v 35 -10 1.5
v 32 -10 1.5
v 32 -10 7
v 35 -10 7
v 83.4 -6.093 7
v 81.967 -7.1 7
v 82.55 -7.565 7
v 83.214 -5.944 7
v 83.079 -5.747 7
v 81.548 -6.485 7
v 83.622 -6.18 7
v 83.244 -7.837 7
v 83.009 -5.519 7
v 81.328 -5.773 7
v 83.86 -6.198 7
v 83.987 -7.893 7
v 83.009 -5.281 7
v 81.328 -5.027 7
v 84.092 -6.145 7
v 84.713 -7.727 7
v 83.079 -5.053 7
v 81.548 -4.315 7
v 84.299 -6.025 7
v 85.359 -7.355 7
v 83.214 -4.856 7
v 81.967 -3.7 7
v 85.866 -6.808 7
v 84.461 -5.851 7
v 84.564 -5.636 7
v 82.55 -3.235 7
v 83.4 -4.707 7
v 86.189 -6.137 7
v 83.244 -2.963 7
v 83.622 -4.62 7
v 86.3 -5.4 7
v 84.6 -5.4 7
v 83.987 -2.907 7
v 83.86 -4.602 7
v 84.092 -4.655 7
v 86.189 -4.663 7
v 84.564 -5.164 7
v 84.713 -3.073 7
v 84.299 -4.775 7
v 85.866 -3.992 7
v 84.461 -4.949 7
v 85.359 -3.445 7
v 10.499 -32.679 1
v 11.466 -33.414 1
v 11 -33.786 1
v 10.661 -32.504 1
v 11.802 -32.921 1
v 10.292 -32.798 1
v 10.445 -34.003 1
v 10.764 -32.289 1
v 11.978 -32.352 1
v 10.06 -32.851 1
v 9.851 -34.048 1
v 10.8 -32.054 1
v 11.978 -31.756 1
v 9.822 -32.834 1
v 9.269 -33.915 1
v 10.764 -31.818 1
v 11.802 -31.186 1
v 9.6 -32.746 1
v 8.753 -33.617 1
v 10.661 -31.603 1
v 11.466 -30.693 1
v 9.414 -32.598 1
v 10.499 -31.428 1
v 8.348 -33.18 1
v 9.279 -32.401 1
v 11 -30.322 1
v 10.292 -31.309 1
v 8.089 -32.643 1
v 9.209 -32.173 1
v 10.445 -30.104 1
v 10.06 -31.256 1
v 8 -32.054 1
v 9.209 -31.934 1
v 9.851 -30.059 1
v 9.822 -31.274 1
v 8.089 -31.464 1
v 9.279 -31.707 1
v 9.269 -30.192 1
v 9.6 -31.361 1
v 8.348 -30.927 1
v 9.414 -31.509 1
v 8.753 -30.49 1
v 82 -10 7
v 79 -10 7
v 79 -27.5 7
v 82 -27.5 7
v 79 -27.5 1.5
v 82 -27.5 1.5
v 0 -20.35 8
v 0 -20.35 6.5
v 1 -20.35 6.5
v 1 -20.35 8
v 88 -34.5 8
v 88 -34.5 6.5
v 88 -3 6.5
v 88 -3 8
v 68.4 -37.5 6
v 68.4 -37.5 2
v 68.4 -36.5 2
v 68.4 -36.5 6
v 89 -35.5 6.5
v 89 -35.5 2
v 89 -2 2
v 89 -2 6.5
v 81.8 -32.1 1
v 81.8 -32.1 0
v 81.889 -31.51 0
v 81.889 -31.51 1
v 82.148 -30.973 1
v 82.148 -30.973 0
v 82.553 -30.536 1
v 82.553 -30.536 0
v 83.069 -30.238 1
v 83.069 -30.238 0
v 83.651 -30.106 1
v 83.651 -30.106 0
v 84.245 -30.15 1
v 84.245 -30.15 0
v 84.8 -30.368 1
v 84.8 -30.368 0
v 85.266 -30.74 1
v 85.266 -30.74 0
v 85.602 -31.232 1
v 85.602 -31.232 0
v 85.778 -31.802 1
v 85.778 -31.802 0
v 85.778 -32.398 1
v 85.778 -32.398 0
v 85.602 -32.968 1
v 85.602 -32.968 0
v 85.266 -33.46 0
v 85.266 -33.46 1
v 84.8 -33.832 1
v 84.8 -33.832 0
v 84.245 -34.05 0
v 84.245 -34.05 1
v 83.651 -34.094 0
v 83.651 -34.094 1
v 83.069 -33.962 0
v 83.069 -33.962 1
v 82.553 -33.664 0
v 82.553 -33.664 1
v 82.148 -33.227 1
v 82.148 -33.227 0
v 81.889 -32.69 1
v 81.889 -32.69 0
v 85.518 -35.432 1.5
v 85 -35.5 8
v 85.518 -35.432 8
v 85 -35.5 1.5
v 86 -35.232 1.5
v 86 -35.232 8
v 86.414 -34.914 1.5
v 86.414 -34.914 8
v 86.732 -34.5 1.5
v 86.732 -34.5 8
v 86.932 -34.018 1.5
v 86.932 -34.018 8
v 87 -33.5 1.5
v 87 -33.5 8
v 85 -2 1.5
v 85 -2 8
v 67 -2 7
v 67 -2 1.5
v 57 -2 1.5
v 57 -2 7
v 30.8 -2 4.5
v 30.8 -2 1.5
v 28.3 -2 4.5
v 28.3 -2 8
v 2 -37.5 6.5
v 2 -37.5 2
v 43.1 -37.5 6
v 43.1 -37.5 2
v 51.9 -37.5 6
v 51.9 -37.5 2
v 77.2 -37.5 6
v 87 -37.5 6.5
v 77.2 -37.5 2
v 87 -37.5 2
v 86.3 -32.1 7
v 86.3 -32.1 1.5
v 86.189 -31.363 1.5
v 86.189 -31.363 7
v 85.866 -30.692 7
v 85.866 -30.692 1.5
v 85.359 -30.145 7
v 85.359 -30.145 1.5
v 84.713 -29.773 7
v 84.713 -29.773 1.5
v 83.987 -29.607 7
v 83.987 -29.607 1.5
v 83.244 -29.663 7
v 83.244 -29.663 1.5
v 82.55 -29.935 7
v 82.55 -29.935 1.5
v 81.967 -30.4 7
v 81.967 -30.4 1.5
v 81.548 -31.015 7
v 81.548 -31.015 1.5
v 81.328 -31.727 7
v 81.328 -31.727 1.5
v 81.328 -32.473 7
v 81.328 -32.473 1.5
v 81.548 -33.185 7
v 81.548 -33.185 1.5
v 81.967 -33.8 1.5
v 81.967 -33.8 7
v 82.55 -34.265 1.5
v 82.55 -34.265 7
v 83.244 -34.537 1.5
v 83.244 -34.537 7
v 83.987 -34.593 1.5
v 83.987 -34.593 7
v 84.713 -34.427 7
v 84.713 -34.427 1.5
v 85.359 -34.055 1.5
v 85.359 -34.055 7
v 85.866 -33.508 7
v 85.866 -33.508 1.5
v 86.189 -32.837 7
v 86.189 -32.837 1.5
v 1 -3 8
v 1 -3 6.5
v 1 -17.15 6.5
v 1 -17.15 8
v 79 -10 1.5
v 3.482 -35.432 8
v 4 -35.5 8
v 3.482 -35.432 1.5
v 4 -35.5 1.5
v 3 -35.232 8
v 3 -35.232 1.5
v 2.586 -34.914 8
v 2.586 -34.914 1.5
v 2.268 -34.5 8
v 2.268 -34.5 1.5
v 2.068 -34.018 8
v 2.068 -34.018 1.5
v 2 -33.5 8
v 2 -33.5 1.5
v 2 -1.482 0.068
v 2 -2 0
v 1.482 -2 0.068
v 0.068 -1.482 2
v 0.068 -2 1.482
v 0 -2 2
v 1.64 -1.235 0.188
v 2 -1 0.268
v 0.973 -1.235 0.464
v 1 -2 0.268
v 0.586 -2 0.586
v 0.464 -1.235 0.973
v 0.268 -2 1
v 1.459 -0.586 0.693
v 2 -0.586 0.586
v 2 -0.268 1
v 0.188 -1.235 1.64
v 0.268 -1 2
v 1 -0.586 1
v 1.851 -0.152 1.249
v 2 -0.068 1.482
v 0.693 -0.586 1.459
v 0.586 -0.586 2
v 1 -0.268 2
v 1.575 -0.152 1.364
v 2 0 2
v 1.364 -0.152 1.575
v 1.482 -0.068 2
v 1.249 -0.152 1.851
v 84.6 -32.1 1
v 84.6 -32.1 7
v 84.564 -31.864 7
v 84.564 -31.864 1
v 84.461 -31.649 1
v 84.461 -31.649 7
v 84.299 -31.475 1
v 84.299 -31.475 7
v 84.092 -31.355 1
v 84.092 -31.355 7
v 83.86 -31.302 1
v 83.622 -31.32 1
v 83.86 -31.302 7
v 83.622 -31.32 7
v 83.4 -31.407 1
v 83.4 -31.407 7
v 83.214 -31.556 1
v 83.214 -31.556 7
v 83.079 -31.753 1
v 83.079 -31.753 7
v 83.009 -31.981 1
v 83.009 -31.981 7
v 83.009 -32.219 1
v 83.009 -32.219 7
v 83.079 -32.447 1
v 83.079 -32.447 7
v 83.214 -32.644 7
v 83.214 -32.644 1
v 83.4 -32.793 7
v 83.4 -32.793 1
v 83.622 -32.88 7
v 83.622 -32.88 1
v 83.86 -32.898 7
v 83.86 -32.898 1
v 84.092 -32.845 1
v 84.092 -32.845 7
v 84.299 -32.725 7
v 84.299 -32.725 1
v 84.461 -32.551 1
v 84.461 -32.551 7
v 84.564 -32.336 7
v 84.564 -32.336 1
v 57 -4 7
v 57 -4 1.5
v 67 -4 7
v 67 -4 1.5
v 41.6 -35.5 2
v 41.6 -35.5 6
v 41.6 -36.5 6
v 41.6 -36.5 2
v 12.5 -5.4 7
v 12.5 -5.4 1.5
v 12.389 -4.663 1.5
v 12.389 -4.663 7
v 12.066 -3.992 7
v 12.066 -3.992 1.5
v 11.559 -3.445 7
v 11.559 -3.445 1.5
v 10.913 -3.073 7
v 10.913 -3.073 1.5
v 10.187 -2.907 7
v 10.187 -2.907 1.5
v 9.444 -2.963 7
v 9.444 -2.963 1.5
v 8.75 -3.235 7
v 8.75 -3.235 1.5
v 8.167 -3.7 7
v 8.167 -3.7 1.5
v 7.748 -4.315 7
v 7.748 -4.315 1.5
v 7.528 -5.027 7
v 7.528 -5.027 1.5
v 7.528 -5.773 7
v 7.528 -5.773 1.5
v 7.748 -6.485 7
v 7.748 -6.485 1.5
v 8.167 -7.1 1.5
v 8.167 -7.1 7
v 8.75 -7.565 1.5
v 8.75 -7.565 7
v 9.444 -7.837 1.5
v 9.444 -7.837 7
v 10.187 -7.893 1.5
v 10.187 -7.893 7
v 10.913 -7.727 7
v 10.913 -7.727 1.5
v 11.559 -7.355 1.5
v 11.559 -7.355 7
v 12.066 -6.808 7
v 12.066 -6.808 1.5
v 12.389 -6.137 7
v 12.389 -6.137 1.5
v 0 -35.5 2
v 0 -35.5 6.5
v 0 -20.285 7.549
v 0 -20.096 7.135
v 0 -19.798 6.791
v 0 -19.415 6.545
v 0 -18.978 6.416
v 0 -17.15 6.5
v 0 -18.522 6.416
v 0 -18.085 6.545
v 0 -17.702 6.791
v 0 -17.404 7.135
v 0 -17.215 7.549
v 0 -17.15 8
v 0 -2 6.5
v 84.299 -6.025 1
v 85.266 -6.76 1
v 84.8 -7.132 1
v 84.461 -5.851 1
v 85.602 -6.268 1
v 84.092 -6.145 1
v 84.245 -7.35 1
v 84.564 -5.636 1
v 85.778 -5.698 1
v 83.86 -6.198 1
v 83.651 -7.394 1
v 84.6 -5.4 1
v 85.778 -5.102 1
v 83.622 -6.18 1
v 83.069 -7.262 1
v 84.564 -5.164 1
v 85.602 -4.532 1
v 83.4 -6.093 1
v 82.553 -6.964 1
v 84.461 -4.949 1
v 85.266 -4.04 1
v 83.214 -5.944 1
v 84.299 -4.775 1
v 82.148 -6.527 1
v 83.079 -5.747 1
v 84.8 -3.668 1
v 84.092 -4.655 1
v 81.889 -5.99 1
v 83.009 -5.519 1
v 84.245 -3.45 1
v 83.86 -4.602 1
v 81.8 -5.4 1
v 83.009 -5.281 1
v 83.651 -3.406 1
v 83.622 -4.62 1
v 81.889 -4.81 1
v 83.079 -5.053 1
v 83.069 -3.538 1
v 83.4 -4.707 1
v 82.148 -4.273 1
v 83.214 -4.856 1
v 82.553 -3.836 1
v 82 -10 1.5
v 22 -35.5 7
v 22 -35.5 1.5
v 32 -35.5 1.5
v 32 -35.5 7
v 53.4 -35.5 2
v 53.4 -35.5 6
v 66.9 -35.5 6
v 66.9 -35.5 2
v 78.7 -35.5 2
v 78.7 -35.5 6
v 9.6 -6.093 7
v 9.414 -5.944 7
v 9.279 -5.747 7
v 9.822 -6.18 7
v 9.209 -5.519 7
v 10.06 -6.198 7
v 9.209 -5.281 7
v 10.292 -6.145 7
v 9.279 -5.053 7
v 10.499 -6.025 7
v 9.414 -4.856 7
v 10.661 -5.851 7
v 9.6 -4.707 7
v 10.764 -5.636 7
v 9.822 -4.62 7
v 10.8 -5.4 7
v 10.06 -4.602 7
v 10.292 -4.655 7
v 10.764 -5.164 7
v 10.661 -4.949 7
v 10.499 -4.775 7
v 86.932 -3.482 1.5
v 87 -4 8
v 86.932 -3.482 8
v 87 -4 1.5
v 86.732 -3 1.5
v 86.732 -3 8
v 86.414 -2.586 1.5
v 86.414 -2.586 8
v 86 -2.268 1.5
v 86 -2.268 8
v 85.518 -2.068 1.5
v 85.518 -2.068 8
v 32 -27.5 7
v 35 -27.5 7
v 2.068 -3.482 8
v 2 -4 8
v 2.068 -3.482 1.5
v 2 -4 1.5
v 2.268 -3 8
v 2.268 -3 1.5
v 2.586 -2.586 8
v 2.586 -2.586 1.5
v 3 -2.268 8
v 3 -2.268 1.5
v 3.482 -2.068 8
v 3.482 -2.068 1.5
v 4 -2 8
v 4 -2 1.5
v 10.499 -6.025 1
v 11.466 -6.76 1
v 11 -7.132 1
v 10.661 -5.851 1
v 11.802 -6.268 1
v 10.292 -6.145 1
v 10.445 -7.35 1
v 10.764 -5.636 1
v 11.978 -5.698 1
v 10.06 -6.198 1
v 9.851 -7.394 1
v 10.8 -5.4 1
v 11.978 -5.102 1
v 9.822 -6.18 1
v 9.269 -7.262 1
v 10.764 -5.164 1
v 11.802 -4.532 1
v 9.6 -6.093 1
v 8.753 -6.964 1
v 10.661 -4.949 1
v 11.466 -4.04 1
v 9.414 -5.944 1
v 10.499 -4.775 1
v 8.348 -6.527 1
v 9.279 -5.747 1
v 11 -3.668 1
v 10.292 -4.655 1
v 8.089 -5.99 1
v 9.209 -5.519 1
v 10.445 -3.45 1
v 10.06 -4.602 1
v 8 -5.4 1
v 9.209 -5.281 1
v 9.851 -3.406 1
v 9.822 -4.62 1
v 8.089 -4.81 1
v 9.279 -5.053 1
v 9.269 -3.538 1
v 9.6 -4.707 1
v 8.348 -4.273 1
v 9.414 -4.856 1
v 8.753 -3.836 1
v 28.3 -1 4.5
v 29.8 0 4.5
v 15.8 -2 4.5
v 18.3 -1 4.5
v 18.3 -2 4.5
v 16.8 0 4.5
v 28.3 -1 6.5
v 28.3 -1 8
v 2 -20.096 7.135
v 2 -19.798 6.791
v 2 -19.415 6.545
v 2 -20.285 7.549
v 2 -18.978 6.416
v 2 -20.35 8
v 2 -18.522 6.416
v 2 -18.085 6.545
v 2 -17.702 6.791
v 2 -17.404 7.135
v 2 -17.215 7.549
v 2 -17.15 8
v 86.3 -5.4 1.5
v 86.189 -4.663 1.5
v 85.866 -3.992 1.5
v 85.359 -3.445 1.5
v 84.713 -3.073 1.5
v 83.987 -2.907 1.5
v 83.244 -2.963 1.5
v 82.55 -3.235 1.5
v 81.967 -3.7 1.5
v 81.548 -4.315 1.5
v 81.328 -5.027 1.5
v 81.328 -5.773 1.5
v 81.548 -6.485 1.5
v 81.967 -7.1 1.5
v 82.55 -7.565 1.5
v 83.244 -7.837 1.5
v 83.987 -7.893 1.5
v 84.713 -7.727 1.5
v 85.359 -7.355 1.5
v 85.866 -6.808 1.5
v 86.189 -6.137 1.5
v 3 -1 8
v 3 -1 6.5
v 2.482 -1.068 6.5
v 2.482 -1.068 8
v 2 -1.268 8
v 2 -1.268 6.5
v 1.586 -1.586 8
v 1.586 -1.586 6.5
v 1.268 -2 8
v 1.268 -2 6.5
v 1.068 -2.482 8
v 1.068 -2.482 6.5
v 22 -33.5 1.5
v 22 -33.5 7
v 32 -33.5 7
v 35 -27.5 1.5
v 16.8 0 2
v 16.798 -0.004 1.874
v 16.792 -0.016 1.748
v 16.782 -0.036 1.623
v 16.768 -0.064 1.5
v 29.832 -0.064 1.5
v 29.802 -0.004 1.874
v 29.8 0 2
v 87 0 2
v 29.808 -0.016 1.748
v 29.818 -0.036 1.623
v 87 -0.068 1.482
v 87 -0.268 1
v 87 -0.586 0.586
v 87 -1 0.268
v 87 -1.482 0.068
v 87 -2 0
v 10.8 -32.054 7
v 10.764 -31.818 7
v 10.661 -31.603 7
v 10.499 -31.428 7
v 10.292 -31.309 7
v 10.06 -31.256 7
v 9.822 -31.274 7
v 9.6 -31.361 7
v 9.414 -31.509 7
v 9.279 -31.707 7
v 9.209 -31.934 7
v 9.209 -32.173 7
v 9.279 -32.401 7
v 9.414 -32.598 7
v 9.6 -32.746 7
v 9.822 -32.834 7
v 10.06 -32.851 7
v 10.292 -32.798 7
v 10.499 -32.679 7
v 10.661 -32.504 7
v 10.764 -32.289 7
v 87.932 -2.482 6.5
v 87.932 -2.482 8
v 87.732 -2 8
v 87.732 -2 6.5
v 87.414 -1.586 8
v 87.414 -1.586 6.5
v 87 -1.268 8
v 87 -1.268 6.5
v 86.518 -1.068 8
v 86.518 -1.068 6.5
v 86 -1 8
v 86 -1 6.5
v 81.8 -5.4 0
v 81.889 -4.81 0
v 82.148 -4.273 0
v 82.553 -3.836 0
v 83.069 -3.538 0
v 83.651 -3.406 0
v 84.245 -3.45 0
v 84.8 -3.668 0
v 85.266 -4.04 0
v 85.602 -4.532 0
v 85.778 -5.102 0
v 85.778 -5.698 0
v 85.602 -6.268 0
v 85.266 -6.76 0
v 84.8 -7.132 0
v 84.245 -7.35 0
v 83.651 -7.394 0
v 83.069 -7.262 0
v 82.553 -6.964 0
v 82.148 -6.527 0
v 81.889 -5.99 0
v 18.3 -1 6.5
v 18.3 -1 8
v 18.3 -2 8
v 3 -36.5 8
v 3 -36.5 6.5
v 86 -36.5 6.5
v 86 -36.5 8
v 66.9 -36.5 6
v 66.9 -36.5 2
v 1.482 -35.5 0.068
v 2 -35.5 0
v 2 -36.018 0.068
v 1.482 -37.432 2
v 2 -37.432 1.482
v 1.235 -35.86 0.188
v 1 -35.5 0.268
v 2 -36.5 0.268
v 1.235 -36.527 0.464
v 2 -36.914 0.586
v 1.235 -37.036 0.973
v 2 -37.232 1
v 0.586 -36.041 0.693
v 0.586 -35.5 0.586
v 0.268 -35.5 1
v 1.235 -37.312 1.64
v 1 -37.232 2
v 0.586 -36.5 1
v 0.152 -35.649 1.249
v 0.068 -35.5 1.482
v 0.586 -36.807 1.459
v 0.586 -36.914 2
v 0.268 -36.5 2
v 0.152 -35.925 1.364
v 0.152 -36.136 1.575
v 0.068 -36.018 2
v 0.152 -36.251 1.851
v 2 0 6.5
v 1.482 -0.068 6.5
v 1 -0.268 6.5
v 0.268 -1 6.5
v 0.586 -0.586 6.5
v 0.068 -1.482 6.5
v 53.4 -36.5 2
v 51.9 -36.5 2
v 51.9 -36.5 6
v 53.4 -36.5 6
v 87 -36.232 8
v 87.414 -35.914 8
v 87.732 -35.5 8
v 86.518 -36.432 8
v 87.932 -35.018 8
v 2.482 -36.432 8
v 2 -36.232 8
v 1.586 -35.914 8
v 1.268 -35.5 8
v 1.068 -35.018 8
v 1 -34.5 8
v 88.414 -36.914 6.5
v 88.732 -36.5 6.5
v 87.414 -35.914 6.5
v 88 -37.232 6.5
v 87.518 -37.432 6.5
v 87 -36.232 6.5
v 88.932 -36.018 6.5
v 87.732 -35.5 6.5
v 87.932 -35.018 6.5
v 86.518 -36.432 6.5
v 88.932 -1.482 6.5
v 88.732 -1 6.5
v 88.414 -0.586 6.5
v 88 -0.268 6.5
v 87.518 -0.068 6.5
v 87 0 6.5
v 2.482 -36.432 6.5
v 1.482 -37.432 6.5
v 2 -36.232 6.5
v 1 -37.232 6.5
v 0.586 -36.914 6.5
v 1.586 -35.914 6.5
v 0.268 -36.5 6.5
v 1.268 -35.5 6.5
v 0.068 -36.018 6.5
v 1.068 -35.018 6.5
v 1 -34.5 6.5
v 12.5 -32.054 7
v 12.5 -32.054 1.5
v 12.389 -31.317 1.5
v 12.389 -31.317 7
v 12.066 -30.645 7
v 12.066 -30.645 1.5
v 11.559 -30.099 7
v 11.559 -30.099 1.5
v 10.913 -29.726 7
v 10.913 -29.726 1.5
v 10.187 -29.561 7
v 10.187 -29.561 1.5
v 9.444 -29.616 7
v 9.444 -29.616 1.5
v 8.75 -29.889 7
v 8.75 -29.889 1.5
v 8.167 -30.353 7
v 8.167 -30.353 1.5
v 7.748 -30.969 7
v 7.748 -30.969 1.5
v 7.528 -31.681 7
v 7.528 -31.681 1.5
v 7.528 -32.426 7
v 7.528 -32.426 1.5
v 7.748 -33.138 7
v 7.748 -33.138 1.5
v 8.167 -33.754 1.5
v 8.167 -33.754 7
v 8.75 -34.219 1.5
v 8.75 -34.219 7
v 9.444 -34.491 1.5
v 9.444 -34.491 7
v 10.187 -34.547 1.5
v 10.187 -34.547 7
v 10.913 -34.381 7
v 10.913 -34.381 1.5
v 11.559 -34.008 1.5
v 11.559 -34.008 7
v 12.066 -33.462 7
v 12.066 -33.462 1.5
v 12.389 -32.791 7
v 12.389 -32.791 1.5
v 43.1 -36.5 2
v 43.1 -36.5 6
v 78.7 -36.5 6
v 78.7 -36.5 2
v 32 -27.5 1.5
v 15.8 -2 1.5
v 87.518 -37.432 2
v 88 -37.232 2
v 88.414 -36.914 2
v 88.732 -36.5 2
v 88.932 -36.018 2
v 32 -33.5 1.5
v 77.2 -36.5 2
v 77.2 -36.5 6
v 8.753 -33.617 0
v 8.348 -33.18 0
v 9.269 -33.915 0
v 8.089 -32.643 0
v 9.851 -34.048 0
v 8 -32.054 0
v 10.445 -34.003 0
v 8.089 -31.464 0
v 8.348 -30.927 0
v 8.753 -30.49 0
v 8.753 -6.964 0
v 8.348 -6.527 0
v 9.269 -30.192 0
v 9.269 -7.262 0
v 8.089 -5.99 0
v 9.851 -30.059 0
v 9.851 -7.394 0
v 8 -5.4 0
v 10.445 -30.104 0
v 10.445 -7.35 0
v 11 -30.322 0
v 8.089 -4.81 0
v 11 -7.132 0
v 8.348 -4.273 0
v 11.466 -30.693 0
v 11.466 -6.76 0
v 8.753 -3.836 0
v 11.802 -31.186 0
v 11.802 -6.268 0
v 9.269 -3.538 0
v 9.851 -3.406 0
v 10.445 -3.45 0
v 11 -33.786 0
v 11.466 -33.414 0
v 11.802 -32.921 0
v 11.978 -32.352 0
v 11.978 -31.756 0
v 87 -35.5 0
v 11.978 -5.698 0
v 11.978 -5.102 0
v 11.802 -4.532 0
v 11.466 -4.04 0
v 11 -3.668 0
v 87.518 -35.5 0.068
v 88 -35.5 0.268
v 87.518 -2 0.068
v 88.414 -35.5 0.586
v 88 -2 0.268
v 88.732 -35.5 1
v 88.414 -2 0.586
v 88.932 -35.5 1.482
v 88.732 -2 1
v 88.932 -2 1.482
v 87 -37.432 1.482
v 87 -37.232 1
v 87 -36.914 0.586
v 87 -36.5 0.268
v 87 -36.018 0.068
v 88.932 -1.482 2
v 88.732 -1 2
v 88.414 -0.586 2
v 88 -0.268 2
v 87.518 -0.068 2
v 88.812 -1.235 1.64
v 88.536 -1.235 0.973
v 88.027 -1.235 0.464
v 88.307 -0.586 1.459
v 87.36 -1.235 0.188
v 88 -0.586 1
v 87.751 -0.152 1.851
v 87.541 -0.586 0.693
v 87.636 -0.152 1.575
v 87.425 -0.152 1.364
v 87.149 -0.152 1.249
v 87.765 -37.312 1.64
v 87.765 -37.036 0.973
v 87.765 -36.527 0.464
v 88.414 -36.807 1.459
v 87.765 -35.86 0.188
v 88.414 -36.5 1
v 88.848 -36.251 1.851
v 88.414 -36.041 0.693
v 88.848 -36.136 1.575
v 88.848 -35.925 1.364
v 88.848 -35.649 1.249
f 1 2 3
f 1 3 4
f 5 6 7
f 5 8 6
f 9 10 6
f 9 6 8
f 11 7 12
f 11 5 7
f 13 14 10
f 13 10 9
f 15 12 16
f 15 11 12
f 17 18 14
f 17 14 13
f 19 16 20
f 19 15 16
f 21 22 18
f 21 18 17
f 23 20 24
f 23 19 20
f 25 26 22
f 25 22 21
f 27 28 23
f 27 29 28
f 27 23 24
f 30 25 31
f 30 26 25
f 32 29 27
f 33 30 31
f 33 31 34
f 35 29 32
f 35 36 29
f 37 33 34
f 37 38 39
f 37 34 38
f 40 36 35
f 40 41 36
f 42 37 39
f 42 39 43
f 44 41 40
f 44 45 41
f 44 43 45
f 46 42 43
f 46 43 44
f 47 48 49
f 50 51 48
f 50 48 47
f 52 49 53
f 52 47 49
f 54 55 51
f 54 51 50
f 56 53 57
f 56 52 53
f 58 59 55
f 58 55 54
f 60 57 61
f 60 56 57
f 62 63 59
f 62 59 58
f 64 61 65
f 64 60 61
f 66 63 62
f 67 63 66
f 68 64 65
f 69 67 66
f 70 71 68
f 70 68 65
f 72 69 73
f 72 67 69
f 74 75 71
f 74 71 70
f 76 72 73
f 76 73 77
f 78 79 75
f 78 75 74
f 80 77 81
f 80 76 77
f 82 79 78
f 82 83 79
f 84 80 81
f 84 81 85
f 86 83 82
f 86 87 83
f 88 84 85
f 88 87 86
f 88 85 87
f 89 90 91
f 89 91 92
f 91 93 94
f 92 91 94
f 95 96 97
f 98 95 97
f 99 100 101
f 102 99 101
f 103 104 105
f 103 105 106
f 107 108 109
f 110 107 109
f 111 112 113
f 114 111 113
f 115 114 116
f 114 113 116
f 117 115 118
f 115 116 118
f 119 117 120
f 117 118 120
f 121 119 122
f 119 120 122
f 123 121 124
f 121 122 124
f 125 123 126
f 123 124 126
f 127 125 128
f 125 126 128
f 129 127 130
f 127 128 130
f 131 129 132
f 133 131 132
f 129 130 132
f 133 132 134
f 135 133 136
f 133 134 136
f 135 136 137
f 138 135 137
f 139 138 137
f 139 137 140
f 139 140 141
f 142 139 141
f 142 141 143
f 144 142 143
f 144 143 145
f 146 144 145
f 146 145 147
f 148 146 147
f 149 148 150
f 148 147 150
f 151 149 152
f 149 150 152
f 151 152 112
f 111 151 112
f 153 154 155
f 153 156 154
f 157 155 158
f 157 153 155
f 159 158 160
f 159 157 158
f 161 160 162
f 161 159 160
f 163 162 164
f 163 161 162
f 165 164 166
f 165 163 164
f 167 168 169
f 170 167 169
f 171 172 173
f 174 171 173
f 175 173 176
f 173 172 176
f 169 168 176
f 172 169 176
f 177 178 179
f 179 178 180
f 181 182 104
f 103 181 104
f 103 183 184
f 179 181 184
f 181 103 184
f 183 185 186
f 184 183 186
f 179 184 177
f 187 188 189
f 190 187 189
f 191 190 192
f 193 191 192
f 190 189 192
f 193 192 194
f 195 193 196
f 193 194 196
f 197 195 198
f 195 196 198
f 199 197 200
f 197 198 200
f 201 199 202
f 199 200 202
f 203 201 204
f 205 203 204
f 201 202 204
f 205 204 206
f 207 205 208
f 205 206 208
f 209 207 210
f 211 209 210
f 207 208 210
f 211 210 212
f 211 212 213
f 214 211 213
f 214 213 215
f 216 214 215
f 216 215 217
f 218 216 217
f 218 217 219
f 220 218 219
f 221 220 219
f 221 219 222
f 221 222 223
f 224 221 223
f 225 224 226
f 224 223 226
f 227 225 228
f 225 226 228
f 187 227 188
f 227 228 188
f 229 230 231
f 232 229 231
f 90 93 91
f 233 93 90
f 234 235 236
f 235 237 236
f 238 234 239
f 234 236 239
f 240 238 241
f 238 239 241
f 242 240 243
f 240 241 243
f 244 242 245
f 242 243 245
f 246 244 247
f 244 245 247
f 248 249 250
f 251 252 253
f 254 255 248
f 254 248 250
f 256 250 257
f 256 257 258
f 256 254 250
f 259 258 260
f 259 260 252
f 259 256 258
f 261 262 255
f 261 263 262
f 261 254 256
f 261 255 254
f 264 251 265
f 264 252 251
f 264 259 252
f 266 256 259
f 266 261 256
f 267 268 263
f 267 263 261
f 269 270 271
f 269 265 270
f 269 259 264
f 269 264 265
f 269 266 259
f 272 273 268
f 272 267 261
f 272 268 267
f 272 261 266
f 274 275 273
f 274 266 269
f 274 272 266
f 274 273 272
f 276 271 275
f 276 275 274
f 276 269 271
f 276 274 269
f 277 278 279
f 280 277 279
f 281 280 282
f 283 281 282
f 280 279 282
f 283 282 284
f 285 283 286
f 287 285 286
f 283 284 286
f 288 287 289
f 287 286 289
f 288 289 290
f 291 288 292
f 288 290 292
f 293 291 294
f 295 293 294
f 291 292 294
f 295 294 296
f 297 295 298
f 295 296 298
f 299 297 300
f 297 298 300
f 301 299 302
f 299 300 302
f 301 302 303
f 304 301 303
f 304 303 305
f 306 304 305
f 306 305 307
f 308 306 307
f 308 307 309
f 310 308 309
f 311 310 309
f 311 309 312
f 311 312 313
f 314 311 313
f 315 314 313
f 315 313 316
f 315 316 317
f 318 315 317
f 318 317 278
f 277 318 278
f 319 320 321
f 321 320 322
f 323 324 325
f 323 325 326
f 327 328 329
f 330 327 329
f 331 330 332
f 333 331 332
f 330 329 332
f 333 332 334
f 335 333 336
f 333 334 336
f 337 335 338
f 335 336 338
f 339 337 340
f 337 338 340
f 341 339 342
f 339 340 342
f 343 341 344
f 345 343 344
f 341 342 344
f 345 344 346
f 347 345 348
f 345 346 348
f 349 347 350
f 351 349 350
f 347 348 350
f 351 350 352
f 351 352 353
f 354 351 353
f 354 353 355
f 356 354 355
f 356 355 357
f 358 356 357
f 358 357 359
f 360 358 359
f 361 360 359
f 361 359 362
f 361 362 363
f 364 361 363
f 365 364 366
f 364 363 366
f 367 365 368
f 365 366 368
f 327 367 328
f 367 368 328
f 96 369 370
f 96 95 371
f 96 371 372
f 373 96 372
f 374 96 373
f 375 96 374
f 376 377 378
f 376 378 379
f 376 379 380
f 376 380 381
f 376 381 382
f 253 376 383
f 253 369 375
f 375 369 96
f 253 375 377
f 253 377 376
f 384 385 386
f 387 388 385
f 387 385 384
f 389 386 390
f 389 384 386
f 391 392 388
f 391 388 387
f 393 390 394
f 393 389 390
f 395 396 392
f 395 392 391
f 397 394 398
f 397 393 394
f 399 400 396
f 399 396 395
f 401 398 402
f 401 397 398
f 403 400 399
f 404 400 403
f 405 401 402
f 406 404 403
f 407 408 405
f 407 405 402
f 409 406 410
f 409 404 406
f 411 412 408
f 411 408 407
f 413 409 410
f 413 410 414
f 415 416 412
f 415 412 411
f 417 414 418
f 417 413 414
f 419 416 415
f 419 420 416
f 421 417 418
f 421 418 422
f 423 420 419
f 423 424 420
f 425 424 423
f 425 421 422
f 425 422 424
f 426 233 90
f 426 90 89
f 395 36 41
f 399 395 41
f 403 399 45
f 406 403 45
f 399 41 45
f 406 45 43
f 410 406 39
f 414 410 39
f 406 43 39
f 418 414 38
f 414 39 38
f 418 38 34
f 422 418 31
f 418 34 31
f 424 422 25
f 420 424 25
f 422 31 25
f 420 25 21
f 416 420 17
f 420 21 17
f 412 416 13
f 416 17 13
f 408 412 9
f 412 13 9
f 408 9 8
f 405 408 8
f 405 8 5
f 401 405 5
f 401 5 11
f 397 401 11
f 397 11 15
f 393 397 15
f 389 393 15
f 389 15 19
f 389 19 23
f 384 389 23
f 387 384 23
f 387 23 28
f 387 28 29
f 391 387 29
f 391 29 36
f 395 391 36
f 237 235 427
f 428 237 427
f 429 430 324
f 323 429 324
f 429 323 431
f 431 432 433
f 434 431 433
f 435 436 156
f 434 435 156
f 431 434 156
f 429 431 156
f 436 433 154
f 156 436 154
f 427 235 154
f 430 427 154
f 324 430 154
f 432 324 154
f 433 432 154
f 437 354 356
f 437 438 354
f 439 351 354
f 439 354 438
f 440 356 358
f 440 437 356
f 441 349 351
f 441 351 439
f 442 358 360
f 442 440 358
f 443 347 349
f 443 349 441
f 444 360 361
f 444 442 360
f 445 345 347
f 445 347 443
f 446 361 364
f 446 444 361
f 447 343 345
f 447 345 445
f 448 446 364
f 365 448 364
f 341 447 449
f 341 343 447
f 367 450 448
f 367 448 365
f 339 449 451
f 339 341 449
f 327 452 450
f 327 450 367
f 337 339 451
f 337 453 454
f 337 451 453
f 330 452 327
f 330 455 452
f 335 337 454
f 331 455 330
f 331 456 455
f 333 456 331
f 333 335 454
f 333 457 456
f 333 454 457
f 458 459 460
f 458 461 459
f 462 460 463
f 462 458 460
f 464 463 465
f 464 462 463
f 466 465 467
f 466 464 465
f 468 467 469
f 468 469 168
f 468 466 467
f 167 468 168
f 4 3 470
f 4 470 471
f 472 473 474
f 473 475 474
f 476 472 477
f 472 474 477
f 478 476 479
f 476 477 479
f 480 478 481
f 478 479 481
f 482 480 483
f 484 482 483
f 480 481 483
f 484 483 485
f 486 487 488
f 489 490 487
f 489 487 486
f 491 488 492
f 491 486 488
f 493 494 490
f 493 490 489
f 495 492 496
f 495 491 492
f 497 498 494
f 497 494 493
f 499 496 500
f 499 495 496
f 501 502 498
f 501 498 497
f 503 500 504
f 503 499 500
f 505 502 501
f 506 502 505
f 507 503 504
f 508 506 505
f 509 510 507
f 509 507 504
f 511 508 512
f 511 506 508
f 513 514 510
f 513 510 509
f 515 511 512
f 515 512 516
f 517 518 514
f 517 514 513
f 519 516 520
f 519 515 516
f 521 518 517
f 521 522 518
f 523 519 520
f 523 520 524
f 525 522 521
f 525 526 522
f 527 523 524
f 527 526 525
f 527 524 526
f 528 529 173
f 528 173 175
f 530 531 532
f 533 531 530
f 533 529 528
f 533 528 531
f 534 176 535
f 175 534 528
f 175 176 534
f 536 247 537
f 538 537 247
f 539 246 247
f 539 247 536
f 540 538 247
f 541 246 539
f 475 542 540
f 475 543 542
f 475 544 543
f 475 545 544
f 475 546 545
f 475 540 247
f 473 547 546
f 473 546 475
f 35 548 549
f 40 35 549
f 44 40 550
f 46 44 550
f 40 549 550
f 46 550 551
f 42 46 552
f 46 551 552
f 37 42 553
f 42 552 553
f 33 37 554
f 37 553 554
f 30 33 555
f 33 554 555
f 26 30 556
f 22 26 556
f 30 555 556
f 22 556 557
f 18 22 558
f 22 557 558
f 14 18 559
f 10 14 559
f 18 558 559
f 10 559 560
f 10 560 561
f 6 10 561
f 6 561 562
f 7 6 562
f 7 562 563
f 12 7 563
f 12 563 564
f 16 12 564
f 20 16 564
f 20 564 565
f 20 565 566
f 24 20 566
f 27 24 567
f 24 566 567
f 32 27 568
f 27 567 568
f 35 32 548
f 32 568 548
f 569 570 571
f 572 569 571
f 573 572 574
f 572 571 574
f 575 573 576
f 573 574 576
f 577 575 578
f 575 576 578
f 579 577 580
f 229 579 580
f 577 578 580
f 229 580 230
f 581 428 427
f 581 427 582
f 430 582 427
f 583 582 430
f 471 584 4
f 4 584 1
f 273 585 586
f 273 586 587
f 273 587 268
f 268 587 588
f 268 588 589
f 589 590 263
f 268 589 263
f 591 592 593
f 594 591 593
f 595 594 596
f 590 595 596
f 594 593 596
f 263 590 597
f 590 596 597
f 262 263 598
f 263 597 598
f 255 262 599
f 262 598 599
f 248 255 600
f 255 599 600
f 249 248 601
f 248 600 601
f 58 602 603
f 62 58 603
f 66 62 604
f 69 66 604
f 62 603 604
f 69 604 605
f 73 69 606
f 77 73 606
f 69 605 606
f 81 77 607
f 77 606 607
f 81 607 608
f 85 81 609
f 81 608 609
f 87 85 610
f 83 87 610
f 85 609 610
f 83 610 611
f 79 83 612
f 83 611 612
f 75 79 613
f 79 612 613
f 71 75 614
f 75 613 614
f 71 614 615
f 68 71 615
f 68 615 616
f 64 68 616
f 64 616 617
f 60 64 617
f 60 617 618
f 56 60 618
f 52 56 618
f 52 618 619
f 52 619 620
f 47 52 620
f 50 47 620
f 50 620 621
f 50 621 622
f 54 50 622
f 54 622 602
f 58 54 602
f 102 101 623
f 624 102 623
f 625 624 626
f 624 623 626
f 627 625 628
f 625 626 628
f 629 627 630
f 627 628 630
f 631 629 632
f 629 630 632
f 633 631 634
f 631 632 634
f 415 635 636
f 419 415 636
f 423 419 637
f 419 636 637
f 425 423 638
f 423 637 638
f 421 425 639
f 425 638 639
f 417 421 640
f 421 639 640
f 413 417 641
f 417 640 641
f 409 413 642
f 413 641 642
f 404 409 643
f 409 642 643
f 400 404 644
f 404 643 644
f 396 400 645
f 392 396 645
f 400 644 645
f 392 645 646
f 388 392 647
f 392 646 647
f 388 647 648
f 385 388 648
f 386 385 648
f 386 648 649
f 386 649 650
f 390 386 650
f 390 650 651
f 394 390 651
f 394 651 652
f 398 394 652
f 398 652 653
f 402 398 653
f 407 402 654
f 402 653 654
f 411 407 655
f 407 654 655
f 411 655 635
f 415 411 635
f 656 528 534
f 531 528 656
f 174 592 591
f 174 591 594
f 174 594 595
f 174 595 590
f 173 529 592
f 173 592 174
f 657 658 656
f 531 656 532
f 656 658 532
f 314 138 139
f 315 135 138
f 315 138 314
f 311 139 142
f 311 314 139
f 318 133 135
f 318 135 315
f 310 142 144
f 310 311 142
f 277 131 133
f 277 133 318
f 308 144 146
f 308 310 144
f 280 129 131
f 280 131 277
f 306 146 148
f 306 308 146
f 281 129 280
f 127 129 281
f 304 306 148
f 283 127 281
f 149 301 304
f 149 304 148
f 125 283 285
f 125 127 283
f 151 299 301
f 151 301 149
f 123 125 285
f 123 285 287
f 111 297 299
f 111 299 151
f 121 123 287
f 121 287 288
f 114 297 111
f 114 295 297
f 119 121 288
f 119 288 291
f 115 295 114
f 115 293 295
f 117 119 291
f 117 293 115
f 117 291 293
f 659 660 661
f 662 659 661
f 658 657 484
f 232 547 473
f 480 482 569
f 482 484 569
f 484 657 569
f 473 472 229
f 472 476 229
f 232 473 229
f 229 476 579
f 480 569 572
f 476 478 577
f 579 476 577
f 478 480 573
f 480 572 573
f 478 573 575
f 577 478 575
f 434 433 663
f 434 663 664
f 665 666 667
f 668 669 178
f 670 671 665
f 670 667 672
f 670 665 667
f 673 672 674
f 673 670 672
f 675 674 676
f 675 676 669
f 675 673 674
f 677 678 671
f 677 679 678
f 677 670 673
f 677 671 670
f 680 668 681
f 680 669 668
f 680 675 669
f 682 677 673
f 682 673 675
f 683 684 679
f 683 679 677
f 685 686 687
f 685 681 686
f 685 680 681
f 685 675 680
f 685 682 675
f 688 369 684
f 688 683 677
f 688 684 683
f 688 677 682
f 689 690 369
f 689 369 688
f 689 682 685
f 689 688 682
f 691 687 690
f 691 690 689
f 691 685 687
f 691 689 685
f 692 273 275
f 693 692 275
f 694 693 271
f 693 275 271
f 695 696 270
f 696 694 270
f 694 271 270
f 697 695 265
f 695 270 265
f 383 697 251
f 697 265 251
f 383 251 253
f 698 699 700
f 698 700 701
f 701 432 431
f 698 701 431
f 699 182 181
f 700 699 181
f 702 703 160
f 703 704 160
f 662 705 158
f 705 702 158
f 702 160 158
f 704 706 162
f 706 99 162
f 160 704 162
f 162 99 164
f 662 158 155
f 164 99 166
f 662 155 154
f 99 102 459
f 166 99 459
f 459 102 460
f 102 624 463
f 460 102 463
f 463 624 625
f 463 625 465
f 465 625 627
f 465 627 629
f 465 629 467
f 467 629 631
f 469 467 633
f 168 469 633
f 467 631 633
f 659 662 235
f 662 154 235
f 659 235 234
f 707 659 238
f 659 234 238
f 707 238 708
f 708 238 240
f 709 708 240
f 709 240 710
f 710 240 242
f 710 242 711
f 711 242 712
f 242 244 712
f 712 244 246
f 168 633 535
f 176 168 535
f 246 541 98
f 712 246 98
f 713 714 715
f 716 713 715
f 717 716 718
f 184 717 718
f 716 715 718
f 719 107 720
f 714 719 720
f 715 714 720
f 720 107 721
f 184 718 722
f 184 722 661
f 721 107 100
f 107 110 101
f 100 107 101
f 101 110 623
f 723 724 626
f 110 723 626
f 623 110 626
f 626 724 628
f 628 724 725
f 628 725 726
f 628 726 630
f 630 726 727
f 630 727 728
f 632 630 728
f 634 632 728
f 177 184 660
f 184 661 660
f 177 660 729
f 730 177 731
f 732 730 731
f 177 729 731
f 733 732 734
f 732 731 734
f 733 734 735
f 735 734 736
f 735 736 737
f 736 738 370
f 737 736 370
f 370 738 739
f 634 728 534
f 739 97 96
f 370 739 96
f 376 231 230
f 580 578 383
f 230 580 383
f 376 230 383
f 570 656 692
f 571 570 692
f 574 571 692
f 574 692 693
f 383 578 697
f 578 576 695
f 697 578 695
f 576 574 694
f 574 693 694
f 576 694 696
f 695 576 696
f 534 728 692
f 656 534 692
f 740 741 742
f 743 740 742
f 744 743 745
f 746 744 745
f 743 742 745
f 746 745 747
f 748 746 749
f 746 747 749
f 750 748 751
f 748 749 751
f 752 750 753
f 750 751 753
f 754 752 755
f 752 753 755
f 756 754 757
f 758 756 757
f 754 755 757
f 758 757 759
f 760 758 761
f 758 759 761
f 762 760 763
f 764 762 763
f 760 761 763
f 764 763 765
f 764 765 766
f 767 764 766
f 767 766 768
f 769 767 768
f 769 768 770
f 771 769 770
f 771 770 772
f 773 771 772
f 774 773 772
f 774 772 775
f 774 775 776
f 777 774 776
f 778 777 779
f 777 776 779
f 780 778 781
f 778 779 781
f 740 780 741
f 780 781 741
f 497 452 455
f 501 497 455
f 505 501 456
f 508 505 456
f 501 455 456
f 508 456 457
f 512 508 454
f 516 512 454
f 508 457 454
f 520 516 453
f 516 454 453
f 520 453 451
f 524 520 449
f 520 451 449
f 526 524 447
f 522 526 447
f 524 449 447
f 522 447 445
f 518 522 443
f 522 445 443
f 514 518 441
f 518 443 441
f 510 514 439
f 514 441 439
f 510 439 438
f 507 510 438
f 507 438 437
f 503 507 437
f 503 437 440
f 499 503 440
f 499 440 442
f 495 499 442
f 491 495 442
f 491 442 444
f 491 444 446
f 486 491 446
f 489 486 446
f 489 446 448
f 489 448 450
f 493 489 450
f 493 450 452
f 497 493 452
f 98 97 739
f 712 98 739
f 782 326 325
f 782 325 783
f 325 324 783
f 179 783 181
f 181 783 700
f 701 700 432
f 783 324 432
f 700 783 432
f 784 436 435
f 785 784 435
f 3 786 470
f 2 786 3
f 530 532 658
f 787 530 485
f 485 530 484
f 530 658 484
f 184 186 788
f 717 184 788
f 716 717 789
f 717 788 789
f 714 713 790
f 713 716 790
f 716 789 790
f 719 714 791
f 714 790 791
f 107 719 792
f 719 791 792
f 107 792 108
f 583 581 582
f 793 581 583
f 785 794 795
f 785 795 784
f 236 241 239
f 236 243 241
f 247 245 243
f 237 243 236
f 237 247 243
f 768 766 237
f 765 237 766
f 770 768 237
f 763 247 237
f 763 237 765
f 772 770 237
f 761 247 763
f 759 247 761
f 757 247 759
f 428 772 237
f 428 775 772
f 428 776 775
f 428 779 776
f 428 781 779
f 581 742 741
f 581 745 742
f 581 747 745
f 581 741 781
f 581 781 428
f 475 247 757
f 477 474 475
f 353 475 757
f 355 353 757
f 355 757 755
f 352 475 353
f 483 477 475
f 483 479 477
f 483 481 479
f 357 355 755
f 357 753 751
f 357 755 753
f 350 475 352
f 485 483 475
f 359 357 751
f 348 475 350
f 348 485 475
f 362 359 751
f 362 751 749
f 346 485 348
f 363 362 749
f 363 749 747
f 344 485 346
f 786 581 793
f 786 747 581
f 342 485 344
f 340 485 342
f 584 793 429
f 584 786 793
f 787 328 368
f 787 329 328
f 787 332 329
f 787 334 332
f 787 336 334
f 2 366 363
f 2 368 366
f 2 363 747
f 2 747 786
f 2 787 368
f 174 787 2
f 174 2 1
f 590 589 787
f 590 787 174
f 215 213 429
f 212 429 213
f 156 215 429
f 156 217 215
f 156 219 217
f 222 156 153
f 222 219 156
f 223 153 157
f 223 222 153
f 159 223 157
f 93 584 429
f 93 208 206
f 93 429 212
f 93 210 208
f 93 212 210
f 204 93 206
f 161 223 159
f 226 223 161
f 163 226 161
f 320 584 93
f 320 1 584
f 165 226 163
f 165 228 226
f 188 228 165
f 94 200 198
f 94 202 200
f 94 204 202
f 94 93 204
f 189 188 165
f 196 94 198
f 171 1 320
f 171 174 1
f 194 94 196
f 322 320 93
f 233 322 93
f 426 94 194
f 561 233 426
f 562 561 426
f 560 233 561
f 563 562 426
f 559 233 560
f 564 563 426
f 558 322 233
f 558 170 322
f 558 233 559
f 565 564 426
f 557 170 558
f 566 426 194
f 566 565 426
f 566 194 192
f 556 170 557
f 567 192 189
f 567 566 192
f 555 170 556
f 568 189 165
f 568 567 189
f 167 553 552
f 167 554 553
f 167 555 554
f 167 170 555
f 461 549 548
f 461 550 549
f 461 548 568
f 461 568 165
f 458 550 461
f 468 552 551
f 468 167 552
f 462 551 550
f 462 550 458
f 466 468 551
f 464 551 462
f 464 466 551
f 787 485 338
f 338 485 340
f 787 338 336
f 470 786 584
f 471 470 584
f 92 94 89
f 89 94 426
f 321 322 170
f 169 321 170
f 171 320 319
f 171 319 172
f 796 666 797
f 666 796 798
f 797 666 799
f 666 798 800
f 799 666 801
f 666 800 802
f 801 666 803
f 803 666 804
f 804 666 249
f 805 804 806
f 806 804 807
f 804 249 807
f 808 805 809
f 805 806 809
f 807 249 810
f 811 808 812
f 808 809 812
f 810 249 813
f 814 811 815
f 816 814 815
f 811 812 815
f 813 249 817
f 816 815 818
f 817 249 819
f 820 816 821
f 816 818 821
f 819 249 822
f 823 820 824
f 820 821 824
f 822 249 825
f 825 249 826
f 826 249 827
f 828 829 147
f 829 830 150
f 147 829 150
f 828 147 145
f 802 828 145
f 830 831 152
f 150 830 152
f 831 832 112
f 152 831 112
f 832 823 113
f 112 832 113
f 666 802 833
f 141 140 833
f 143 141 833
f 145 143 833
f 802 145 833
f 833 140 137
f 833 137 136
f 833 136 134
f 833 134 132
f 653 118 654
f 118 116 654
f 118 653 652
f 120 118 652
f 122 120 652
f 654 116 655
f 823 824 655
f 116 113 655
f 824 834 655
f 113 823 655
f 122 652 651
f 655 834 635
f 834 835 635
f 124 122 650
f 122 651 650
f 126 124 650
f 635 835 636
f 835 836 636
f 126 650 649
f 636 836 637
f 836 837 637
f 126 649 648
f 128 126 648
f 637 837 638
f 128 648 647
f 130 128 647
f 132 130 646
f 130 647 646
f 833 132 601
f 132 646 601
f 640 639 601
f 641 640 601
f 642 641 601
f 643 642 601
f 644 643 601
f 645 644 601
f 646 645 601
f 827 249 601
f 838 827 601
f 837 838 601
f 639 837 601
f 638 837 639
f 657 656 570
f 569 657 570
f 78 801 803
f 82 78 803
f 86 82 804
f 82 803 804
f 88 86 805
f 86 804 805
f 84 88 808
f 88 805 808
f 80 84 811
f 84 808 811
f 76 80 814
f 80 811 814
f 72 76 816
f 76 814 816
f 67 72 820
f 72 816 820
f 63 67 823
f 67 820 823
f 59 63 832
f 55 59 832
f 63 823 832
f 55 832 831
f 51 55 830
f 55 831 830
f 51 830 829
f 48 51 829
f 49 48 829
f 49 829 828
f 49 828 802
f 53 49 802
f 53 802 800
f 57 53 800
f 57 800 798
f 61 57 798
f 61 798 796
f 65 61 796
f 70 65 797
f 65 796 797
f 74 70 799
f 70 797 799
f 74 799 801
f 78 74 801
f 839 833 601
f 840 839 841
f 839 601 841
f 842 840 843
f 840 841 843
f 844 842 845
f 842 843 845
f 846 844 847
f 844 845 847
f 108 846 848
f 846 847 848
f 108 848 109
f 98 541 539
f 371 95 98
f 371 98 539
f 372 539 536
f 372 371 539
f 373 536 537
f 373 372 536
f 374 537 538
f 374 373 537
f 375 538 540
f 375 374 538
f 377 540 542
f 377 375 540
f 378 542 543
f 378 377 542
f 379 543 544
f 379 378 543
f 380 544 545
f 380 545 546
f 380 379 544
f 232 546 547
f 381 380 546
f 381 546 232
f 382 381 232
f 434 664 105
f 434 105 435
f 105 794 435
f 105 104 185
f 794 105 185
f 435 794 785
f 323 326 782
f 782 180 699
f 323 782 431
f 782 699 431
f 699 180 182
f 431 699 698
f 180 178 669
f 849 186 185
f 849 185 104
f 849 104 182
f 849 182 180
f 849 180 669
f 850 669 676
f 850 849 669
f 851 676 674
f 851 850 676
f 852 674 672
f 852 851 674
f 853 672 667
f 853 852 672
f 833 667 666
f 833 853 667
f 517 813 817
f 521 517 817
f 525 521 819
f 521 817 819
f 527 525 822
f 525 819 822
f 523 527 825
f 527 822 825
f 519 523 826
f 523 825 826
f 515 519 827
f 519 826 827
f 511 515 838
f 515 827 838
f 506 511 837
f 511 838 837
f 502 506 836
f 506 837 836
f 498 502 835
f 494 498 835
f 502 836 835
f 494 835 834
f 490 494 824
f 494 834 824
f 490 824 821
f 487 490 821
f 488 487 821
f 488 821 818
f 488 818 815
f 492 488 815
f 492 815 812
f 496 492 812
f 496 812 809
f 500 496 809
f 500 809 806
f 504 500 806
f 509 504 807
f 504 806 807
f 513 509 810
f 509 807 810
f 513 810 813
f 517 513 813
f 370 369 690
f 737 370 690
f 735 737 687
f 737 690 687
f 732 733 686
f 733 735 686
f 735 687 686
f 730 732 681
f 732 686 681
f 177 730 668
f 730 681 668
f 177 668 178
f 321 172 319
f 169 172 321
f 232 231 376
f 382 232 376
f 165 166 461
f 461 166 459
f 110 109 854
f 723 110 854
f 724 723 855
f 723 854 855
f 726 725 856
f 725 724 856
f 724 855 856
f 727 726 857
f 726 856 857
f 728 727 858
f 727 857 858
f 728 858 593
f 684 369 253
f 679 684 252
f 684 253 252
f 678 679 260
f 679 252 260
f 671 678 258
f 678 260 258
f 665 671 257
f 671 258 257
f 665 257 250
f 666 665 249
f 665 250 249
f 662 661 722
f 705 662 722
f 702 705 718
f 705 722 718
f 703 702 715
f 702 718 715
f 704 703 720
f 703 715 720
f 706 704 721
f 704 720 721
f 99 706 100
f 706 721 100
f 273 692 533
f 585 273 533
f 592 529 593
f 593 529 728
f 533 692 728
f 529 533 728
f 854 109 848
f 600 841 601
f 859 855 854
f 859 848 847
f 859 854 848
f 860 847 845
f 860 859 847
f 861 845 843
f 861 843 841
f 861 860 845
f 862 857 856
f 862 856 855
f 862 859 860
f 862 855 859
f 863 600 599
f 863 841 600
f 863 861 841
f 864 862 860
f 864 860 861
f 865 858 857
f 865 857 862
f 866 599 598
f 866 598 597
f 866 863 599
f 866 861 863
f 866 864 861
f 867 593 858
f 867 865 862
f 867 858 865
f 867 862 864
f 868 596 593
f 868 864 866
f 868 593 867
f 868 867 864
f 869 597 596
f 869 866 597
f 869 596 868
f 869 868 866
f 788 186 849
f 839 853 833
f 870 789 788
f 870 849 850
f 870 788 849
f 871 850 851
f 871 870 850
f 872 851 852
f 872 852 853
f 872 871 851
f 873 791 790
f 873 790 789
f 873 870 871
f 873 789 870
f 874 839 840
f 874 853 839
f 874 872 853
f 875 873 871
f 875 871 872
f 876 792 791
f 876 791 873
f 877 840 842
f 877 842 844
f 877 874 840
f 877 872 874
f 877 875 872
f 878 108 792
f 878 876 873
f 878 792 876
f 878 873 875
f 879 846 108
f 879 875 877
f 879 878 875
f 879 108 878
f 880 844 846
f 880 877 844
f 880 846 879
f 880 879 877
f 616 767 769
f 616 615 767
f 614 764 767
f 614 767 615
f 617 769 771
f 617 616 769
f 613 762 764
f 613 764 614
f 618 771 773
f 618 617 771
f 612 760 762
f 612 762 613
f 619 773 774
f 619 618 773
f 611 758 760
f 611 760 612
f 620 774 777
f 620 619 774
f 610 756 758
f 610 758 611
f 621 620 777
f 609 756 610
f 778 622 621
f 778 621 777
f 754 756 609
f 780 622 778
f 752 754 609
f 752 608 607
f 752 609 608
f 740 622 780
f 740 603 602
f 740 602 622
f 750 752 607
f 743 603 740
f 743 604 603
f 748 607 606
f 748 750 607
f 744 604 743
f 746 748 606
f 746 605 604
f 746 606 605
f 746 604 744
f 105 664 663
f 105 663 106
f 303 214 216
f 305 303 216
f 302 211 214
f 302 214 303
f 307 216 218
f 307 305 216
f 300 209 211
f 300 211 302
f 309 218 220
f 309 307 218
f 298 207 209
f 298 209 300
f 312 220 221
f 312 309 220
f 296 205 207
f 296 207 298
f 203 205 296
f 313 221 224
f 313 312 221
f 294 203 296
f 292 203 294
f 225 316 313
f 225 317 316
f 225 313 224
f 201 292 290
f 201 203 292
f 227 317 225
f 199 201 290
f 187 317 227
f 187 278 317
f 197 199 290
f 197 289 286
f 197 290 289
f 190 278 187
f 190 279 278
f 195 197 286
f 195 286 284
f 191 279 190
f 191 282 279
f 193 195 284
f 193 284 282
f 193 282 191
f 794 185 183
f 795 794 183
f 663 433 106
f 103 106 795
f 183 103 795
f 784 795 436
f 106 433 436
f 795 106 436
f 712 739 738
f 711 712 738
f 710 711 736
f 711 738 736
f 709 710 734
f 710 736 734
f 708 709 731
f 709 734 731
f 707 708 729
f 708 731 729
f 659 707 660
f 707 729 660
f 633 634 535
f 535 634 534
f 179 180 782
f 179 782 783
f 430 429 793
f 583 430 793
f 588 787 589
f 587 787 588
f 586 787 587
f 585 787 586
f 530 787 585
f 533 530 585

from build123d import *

# Parameters (mm, degrees)
SKETCH_1_W           = 89
SKETCH_1_H           = 37.5
EXTRUDE_1_DEPTH      = 8
SKETCH_2_W           = 85
SKETCH_2_H           = 33.5
CUT_EXTRUDE_1_DEPTH  = 6.5
FILLET_2_R           = 2
FILLET_3_R           = 2
FILLET_4_R           = 2
FILLET_5_R           = 2
FILLET_6_R           = 2
FILLET_7_R           = 2
SKETCH_3_R           = 2.5
SKETCH_3_W           = 10
SKETCH_3_H           = 2
SKETCH_3_W_2         = 3
SKETCH_3_H_2         = 17.5
EXTRUDE_2_DEPTH      = 5.5
SKETCH_4_R           = 0.8
CUT_EXTRUDE_2_DEPTH  = 97.831038412
SKETCH_5_R           = 0.8
CUT_EXTRUDE_3_DEPTH  = 97.831038412
SKETCH_6_R           = 0.8
CUT_EXTRUDE_4_DEPTH  = 97.831038412
SKETCH_8_R           = 0.8
CUT_EXTRUDE_5_DEPTH  = 97.831038412
SKETCH_9_R           = 2
CUT_EXTRUDE_6_DEPTH  = 1
CUT_EXTRUDE_7_DEPTH  = 2
SKETCH_11_W          = 8.8
SKETCH_11_H          = 4
CUT_EXTRUDE_8_DEPTH  = 2
SKETCH_12_W          = 11.8
SKETCH_12_H          = 4
CUT_EXTRUDE_9_DEPTH  = 1
CUT_EXTRUDE_10_DEPTH = 6.5
EXTRUDE_3_DEPTH      = 3.5
CUT_EXTRUDE_START    = -1.5
CUT_EXTRUDE_12_DEPTH = 1.5
SKETCH_18_W          = 10
SKETCH_18_H          = 3.5
CUT_EXTRUDE_15_DEPTH = 1


with BuildPart() as part:
    # 草图1 → 凸台-拉伸1 (new body)
    with BuildSketch(Plane.XY):
        with Locations((44.5, -18.75)):
            Rectangle(SKETCH_1_W, SKETCH_1_H)
    extrude(amount=EXTRUDE_1_DEPTH)

    # 草图2 → 切除-拉伸1 (cut)
    with BuildSketch(Plane.XY.offset(8)):
        with Locations((44.5, -18.75)):
            Rectangle(SKETCH_2_W, SKETCH_2_H)
    extrude(amount=-CUT_EXTRUDE_1_DEPTH, mode=Mode.SUBTRACT)

    # 圆角2
    fillet_2_edges = [part.edges().sort_by_distance(p)[0] for p in [
        (44.5, 0, 0),
        (89, -18.75, 0),
        (44.5, -37.5, 0),
        (0, -18.75, 0),
    ]]
    fillet(fillet_2_edges, radius=FILLET_2_R)

    # 圆角3
    fillet_3_edges = [part.edges().sort_by_distance(p)[0] for p in [
        (87, -35.5, 4.75),
    ]]
    fillet(fillet_3_edges, radius=FILLET_3_R)

    # 圆角4
    fillet_4_edges = [part.edges().sort_by_distance(p)[0] for p in [
        (87, -2, 4.75),
    ]]
    fillet(fillet_4_edges, radius=FILLET_4_R)

    # 圆角5
    fillet_5_edges = [part.edges().sort_by_distance(p)[0] for p in [
        (2, -35.5, 4.75),
    ]]
    fillet(fillet_5_edges, radius=FILLET_5_R)

    # 圆角6
    fillet_6_edges = [part.edges().sort_by_distance(p)[0] for p in [
        (2, -2, 4.75),
    ]]
    fillet(fillet_6_edges, radius=FILLET_6_R)

    # 圆角7
    # the kernel refuses this fillet: 2 mm, written as the material it takes off along each edge
    with BuildSketch(Plane(origin=(2, -2, 2), x_dir=(-1, 0, 0), z_dir=(0, 1, 0))) as fillet_7_piece_1_section:
        Polygon((0, 0), (FILLET_7_R, 0), (FILLET_7_R, -FILLET_7_R), (0, -FILLET_7_R), align=None)
    fillet_7_piece_1 = extrude(amount=FILLET_7_R, mode=Mode.PRIVATE)
    fillet_7_piece_1 = fillet_7_piece_1 - Plane(origin=(2, -2, 2), x_dir=(0.7071067811865475, 0, 0.7071067811865475), z_dir=(0, 1, 0)) * Sphere(FILLET_7_R, mode=Mode.PRIVATE)
    add(fillet_7_piece_1, mode=Mode.SUBTRACT)
    with BuildSketch(Plane(origin=(87, -2, 2), x_dir=(1, 0, 0), z_dir=(0, 1, 0))) as fillet_7_piece_2_section:
        Polygon((0, 0), (FILLET_7_R, 0), (FILLET_7_R, FILLET_7_R), (0, FILLET_7_R), align=None)
    fillet_7_piece_2 = extrude(amount=FILLET_7_R, mode=Mode.PRIVATE)
    fillet_7_piece_2 = fillet_7_piece_2 - Plane(origin=(87, -2, 2), x_dir=(-0.7071067811865475, 0, 0.7071067811865475), z_dir=(0, 1, 0)) * Sphere(FILLET_7_R, mode=Mode.PRIVATE)
    add(fillet_7_piece_2, mode=Mode.SUBTRACT)
    with BuildSketch(Plane(origin=(2, -35.5, 2), x_dir=(0, -1, 0), z_dir=(-1, 0, 0))) as fillet_7_piece_3_section:
        Polygon((0, 0), (FILLET_7_R, 0), (FILLET_7_R, -FILLET_7_R), (0, -FILLET_7_R), align=None)
    fillet_7_piece_3 = extrude(amount=FILLET_7_R, mode=Mode.PRIVATE)
    fillet_7_piece_3 = fillet_7_piece_3 - Plane(origin=(2, -35.5, 2), x_dir=(0, 0.7071067811865475, 0.7071067811865475), z_dir=(-1, 0, 0)) * Sphere(FILLET_7_R, mode=Mode.PRIVATE)
    add(fillet_7_piece_3, mode=Mode.SUBTRACT)
    with BuildSketch(Plane(origin=(87, -35.5, 2), x_dir=(0, -1, 0), z_dir=(1, 0, 0))) as fillet_7_piece_4_section:
        Polygon((0, 0), (FILLET_7_R, 0), (FILLET_7_R, FILLET_7_R), (0, FILLET_7_R), align=None)
    fillet_7_piece_4 = extrude(amount=FILLET_7_R, mode=Mode.PRIVATE)
    fillet_7_piece_4 = fillet_7_piece_4 - Plane(origin=(87, -35.5, 2), x_dir=(0, 0.7071067811865475, 0.7071067811865475), z_dir=(1, 0, 0)) * Sphere(FILLET_7_R, mode=Mode.PRIVATE)
    add(fillet_7_piece_4, mode=Mode.SUBTRACT)
    with BuildSketch(Plane(origin=(0, 0, 2), x_dir=(1, 0, 0), z_dir=(0, 0, 1)), Plane(origin=(0, -37.5, 2), x_dir=(0, 1, 0), z_dir=(0, 0, 1))) as fillet_7_piece_5:
        with BuildLine():
            CenterArc((FILLET_7_R, -FILLET_7_R), FILLET_7_R, 90, 90)
            Line((0, -FILLET_7_R), (0, 0))
            Line((0, 0), (FILLET_7_R, 0))
        make_face()
    extrude(amount=11, mode=Mode.SUBTRACT)
    with BuildSketch(Plane(origin=(89, 0, 2), x_dir=(-1, 0, 0), z_dir=(0, 0, 1)), Plane(origin=(89, -37.5, 2), x_dir=(0, 1, 0), z_dir=(0, 0, 1))) as fillet_7_piece_6:
        with BuildLine():
            CenterArc((FILLET_7_R, FILLET_7_R), FILLET_7_R, 180, 90)
            Line((0, FILLET_7_R), (0, 0))
            Line((0, 0), (FILLET_7_R, 0))
        make_face()
    extrude(amount=11, mode=Mode.SUBTRACT)

    # 草图3 → 凸台-拉伸2 (add)
    with BuildSketch(Plane.XY.offset(1.5)):
        with Locations((83.8, -5.4)):
            Circle(SKETCH_3_R)
        with Locations((83.8, -32.1)):
            Circle(SKETCH_3_R)
        with Locations((10, -5.4)):
            Circle(SKETCH_3_R)
        with Locations((10, -32.053618844)):
            Circle(SKETCH_3_R)
        with Locations((62, -3)):
            Rectangle(SKETCH_3_W, SKETCH_3_H)
        with Locations((27, -34.5)):
            Rectangle(SKETCH_3_W, SKETCH_3_H)
        with Locations((80.5, -18.75)):
            Rectangle(SKETCH_3_W_2, SKETCH_3_H_2)
        with Locations((33.5, -18.75)):
            Rectangle(SKETCH_3_W_2, SKETCH_3_H_2)
    extrude(amount=EXTRUDE_2_DEPTH)

    # 草图4 → 切除-拉伸2 (cut, through all)
    with BuildSketch(Plane.XY.offset(7)):
        with Locations((10, -5.4)):
            Circle(SKETCH_4_R)
    extrude(amount=-CUT_EXTRUDE_2_DEPTH, mode=Mode.SUBTRACT)

    # 草图5 → 切除-拉伸3 (cut, through all)
    with BuildSketch(Plane.XY.offset(7)):
        with Locations((83.8, -5.4)):
            Circle(SKETCH_5_R)
    extrude(amount=-CUT_EXTRUDE_3_DEPTH, mode=Mode.SUBTRACT)

    # 草图6 → 切除-拉伸4 (cut, through all)
    with BuildSketch(Plane.XY.offset(7)):
        with Locations((10, -32.053618844)):
            Circle(SKETCH_6_R)
    extrude(amount=-CUT_EXTRUDE_4_DEPTH, mode=Mode.SUBTRACT)

    # 草图8 → 切除-拉伸5 (cut, through all)
    with BuildSketch(Plane.XY.offset(7)):
        with Locations((83.8, -32.1)):
            Circle(SKETCH_8_R)
    extrude(amount=-CUT_EXTRUDE_5_DEPTH, mode=Mode.SUBTRACT)

    # 草图9 → 切除-拉伸6 (cut)
    with BuildSketch(Plane(origin=(0, 0, 0), x_dir=(-1, 0, 0), z_dir=(0, 0, -1))):
        with Locations((-83.8, -5.4)):
            Circle(SKETCH_9_R)
        with Locations((-10, -5.4)):
            Circle(SKETCH_9_R)
        with Locations((-10, -32.053618844)):
            Circle(SKETCH_9_R)
        with Locations((-83.8, -32.1)):
            Circle(SKETCH_9_R)
    extrude(amount=-CUT_EXTRUDE_6_DEPTH, mode=Mode.SUBTRACT)

    # 草图10 → 切除-拉伸7 (cut)
    with BuildSketch(Plane.ZY):
        with BuildLine():
            Line((8, -17.15), (8, -20.35))
            ThreePointArc((8, -20.35), (6.4, -18.75), (8, -17.15))
        make_face()
    extrude(amount=-CUT_EXTRUDE_7_DEPTH, mode=Mode.SUBTRACT)

    # 草图11 → 切除-拉伸8 (cut)
    with BuildSketch(Plane.XZ.offset(37.5)):
        with Locations((72.8, 4)):
            Rectangle(SKETCH_11_W, SKETCH_11_H)
        with Locations((47.5, 4)):
            Rectangle(SKETCH_11_W, SKETCH_11_H)
    extrude(amount=-CUT_EXTRUDE_8_DEPTH, mode=Mode.SUBTRACT)

    # 草图12 → 切除-拉伸9 (cut)
    with BuildSketch(Plane(origin=(0, -35.5, 0), x_dir=(1, 0, 0), z_dir=(0, 1, 0))):
        with Locations((72.8, -4)):
            Rectangle(SKETCH_12_W, SKETCH_12_H)
        with Locations((47.5, -4)):
            Rectangle(SKETCH_12_W, SKETCH_12_H)
    extrude(amount=-CUT_EXTRUDE_9_DEPTH, mode=Mode.SUBTRACT)

    # 草图13 → 切除-拉伸10 (cut)
    with BuildSketch(Plane.XY.offset(8)):
        Polygon((29.8, 0), (30.8, -2), (15.8, -2), (16.8, 0), align=None)
    extrude(amount=-CUT_EXTRUDE_10_DEPTH, mode=Mode.SUBTRACT)

    # 草图14 → 凸台-拉伸3 (add)
    with BuildSketch(Plane.XY.offset(8)):
        Polygon((15.8, -2), (16.8, 0), (29.8, 0), (30.8, -2), align=None)
    extrude(amount=-EXTRUDE_3_DEPTH)

    # 草图15 → 切除-拉伸12 (cut)
    with BuildSketch(Plane.XY.offset(8).offset(CUT_EXTRUDE_START)):
        with BuildLine():
            Line((2, 0), (87, 0))
            ThreePointArc((87, 0), (88.414213562, -0.585786438), (89, -2))
            Line((89, -2), (89, -35.5))
            ThreePointArc((89, -35.5), (88.414213562, -36.914213562), (87, -37.5))
            Line((87, -37.5), (2, -37.5))
            ThreePointArc((2, -37.5), (0.585786438, -36.914213562), (0, -35.5))
            Line((0, -35.5), (0, -20.35))
            Line((0, -20.35), (1, -20.35))
            Line((1, -20.35), (1, -34.5))
            ThreePointArc((1, -34.5), (1.585786438, -35.914213562), (3, -36.5))
            Line((3, -36.5), (86, -36.5))
            ThreePointArc((86, -36.5), (87.414213562, -35.914213562), (88, -34.5))
            Line((88, -34.5), (88, -3))
            ThreePointArc((88, -3), (87.414213562, -1.585786438), (86, -1))
            Line((86, -1), (3, -1))
            ThreePointArc((3, -1), (1.585786438, -1.585786438), (1, -3))
            Line((1, -3), (1, -17.15))
            Line((1, -17.15), (0, -17.15))
            Line((0, -17.15), (0, -2))
            ThreePointArc((0, -2), (0.585786438, -0.585786438), (2, 0))
        make_face()
    extrude(amount=CUT_EXTRUDE_12_DEPTH, mode=Mode.SUBTRACT)

    # 草图18 → 切除-拉伸15 (cut)
    with BuildSketch(Plane(origin=(0, -2, 0), x_dir=(-1, 0, 0), z_dir=(0, -1, 0))):
        with Locations((-23.3, -6.25)):
            Rectangle(SKETCH_18_W, SKETCH_18_H)
    extrude(amount=-CUT_EXTRUDE_15_DEPTH, mode=Mode.SUBTRACT)


solid = part.part
